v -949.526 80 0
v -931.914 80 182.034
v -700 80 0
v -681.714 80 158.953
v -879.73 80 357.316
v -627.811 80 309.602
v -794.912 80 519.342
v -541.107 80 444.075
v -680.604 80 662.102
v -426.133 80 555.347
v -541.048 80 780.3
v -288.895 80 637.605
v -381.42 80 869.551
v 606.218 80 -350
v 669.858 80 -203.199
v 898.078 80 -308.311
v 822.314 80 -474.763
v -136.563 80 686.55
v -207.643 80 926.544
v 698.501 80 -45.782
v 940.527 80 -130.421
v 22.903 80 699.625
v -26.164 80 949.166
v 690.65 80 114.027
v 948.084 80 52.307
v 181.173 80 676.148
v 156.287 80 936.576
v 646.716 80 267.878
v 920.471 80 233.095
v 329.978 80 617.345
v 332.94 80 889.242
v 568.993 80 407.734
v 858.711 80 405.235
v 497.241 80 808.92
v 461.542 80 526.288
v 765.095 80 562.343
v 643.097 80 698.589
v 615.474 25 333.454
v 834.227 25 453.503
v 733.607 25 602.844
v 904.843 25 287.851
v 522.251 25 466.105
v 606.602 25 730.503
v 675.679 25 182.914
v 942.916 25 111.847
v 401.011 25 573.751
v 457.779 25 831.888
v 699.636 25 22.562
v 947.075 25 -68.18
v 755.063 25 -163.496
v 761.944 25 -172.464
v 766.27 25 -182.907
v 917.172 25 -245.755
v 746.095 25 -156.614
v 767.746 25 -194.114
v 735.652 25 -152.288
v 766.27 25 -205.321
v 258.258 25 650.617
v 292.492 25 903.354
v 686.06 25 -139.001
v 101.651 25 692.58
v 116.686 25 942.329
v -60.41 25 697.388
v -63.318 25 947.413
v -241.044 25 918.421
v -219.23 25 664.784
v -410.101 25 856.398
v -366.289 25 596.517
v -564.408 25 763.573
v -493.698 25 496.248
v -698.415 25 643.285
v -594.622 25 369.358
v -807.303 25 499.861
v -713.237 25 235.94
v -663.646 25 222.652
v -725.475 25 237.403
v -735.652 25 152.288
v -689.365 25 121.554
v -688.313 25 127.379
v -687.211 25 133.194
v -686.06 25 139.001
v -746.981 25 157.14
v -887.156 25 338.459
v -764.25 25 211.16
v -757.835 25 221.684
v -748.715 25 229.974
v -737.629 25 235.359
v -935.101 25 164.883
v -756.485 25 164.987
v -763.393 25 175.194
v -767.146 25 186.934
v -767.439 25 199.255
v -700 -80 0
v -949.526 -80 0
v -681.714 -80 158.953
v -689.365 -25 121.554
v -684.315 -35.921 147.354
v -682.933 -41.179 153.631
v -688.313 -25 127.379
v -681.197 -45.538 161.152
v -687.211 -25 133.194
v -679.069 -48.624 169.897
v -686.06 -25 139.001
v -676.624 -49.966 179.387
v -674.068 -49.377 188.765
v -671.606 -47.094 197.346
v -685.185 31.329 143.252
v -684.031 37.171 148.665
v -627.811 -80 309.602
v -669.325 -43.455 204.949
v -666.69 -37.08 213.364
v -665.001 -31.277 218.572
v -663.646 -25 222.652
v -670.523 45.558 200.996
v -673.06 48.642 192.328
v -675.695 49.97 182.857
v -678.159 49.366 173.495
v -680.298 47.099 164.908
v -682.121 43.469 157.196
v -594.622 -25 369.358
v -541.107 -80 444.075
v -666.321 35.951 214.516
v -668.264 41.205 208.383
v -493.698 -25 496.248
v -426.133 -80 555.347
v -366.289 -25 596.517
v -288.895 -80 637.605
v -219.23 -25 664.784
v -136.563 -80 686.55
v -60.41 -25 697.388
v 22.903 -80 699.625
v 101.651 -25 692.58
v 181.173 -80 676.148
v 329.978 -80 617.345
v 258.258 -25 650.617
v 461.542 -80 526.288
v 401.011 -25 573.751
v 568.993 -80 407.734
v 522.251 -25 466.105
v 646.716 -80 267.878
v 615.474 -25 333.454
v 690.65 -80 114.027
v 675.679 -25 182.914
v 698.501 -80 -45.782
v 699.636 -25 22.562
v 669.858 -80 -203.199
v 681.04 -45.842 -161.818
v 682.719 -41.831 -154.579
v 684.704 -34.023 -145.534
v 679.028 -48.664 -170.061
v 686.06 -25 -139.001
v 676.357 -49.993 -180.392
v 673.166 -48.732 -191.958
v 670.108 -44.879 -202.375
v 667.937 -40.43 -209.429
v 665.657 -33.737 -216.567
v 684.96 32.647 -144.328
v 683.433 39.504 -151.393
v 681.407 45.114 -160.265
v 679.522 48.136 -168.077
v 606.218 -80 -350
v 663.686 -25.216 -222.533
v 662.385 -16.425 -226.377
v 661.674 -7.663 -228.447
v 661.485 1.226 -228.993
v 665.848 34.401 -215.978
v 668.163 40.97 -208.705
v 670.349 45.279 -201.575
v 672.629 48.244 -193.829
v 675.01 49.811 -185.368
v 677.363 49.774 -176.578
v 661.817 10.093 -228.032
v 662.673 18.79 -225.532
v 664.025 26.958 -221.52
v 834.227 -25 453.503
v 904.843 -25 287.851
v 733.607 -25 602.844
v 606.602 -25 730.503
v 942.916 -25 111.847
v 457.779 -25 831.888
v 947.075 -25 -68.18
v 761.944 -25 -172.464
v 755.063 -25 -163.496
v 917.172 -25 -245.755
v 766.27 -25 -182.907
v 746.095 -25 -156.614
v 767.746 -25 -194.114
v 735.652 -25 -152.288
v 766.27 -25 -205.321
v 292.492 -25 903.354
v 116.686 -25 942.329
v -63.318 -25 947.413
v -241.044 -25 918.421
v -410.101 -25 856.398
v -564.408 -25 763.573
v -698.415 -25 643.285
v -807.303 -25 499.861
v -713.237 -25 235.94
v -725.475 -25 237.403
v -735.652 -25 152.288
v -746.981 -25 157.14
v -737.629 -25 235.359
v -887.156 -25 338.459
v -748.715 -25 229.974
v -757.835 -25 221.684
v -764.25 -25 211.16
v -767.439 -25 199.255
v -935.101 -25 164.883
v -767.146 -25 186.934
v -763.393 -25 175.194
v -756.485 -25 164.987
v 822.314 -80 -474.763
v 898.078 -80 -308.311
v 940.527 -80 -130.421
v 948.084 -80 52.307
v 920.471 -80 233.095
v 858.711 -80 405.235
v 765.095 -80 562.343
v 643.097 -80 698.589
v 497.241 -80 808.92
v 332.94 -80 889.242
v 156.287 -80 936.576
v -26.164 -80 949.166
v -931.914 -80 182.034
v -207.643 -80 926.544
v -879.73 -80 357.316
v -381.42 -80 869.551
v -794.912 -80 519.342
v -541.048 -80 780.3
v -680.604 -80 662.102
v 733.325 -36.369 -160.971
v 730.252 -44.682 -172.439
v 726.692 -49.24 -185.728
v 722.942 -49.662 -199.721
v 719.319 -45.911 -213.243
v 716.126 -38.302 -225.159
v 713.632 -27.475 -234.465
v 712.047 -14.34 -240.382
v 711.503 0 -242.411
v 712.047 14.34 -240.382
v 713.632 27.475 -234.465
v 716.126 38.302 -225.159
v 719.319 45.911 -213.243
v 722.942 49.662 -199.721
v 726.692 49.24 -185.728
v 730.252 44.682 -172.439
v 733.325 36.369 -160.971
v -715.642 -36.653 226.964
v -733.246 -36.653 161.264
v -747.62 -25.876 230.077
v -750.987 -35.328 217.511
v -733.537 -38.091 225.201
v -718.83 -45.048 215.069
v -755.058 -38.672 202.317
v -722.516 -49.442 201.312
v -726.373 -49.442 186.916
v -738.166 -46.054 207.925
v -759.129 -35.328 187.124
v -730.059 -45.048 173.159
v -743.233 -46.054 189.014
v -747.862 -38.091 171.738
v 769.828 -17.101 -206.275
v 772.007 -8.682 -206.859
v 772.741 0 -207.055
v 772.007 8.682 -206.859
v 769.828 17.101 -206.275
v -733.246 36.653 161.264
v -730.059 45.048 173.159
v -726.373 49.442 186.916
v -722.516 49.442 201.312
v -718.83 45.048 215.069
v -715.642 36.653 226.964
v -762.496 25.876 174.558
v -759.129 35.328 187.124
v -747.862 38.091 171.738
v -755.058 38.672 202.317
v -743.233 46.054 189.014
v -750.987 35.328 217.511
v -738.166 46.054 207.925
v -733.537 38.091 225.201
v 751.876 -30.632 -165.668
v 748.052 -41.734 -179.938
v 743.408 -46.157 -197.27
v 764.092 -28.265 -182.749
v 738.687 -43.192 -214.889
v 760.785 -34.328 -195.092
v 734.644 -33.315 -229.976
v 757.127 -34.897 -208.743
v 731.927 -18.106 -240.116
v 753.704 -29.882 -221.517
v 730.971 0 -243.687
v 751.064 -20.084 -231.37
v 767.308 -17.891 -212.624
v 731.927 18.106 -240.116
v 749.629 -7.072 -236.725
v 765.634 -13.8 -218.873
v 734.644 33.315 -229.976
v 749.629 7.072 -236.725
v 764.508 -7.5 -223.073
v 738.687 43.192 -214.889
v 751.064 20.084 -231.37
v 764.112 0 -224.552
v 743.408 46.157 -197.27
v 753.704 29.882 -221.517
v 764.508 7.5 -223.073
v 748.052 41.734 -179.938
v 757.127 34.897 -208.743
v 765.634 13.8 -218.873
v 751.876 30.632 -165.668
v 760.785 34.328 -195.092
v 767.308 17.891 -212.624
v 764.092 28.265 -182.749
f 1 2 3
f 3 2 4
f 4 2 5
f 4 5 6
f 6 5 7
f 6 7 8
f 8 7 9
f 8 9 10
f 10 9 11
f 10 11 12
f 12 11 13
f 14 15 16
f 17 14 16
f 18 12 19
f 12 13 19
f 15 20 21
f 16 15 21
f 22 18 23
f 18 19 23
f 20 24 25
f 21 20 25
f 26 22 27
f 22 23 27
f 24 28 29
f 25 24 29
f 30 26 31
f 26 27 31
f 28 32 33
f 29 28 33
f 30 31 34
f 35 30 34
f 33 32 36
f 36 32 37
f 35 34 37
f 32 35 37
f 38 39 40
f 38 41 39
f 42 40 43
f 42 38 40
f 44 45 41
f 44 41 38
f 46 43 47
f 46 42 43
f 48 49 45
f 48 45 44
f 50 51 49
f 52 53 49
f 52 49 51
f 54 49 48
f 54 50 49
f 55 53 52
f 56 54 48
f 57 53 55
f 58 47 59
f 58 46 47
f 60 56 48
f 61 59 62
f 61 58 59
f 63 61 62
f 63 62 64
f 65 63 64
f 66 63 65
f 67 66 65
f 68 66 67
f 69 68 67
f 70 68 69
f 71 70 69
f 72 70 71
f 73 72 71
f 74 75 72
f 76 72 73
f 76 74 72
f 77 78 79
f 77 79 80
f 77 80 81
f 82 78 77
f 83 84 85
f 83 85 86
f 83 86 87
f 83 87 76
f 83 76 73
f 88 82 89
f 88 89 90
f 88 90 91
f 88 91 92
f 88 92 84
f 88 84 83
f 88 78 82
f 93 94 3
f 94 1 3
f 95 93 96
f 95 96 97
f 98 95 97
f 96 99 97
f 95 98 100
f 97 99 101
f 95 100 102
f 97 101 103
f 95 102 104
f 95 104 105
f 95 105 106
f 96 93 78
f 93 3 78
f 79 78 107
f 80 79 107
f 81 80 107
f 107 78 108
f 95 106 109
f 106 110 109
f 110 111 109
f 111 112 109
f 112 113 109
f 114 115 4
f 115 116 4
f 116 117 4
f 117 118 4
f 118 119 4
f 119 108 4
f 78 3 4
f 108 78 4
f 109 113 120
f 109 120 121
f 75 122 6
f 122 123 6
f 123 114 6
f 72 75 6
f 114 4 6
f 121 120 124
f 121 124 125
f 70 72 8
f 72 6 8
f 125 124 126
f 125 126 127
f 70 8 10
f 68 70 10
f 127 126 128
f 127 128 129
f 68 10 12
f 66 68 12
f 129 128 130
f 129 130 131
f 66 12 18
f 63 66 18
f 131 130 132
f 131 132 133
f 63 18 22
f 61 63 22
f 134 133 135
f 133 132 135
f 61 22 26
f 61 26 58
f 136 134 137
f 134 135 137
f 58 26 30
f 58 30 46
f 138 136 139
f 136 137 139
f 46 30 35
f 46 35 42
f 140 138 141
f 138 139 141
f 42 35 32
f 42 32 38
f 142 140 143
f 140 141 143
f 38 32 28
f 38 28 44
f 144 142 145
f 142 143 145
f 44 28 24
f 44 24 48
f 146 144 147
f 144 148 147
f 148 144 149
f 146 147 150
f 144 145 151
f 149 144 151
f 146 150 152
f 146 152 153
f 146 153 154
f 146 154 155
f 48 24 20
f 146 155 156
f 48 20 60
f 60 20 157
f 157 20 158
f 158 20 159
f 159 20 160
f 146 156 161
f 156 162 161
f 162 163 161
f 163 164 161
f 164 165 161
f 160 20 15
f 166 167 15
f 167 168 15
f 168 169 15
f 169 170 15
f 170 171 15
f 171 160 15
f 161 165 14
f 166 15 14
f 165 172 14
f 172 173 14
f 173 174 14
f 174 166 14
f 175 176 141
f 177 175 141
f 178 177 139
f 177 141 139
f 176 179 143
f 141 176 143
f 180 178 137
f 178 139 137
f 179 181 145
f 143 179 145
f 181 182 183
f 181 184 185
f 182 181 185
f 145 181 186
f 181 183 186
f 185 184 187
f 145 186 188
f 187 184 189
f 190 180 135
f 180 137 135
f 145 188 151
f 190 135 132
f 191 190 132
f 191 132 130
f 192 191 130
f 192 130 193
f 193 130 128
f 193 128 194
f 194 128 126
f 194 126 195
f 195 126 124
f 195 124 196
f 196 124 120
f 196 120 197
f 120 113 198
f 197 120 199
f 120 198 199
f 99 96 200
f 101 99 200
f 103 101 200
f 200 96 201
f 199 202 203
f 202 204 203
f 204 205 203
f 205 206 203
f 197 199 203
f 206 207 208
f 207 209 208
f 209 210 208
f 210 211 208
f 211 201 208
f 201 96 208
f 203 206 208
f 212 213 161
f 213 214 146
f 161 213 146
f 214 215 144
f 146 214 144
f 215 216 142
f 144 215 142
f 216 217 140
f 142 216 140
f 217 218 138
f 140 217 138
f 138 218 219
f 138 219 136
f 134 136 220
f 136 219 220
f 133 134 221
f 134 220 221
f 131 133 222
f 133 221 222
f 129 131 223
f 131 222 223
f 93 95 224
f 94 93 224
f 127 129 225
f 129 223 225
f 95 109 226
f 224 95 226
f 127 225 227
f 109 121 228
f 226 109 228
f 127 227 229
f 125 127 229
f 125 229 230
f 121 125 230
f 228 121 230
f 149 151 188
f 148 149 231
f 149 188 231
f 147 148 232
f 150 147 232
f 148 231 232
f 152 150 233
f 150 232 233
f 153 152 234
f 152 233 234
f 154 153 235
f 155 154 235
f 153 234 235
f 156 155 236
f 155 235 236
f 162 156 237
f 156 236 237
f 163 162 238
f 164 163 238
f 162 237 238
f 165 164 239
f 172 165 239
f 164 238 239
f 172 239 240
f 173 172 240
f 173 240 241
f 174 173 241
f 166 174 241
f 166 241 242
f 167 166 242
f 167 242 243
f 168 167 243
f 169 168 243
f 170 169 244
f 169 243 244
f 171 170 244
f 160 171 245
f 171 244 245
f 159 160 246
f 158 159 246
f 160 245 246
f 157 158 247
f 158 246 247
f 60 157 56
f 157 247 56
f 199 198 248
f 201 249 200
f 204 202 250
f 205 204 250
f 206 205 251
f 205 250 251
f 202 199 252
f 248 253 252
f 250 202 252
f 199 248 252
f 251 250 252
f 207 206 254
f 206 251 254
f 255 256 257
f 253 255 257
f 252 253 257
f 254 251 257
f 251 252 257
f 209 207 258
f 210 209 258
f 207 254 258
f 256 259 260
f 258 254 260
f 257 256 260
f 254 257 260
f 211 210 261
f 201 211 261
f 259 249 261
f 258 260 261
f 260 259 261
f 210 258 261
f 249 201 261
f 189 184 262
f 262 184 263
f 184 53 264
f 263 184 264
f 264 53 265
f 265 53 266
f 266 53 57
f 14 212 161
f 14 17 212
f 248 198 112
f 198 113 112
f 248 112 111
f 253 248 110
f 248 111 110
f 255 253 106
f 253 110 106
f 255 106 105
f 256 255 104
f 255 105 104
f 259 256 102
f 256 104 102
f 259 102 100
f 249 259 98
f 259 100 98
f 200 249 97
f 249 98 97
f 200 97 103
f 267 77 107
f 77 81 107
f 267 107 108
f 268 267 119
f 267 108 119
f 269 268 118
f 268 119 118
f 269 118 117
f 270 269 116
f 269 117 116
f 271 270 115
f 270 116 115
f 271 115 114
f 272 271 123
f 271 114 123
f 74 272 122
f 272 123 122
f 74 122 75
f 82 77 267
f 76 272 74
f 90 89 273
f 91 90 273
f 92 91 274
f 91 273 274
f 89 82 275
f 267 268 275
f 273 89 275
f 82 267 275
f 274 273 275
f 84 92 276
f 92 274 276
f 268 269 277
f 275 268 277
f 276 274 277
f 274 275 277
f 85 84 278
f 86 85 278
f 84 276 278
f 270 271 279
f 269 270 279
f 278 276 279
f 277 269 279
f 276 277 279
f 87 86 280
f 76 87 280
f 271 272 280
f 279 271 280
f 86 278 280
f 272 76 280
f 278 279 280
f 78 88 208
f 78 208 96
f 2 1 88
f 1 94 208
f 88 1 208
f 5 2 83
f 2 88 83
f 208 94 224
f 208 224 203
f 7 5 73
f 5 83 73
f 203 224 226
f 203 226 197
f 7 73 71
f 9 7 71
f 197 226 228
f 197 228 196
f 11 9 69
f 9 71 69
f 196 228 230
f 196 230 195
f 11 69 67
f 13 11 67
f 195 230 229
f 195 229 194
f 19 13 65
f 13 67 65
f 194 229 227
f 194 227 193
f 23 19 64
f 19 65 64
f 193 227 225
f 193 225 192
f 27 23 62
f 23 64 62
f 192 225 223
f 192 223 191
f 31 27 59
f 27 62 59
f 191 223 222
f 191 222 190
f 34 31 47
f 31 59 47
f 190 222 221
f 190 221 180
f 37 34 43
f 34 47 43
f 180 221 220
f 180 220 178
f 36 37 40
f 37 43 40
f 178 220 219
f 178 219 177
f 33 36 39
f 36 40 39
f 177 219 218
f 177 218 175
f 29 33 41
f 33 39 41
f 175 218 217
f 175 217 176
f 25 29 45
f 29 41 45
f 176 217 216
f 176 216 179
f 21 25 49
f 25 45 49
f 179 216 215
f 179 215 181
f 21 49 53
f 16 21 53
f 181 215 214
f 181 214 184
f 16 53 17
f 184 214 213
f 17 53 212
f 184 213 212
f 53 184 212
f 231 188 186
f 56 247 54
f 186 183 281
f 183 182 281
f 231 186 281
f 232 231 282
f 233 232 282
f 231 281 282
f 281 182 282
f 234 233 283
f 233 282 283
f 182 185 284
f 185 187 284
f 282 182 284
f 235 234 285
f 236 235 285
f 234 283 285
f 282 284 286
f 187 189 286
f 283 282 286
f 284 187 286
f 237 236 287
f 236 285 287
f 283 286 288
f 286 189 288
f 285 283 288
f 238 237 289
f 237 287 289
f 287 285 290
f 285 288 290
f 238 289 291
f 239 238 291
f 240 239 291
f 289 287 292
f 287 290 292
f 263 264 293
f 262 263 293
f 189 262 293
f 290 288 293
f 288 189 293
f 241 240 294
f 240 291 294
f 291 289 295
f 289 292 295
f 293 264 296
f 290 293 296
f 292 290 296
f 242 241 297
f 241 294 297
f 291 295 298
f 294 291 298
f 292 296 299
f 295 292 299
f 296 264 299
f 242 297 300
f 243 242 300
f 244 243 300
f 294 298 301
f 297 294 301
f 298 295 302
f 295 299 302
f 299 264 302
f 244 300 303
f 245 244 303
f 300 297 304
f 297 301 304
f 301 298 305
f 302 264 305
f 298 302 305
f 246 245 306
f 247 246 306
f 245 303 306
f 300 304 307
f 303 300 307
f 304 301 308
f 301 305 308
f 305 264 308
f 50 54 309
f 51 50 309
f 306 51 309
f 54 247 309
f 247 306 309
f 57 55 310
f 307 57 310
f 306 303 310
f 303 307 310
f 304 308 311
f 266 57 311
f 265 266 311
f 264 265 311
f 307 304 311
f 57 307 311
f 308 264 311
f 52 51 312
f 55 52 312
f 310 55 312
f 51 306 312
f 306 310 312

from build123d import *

# Parameters (mm, degrees)
REVOLVE_3_ANGLE               = 210
SKETCH_11_W                   = 1123.766968822
SKETCH_11_H                   = 50
CUT_REVOLVE_6_ANGLE           = 5
CUT_REVOLVE_6_OTHER_WAY_ANGLE = 180


with BuildPart() as part:
    # 草图4 → 旋转3 (revolve)
    with BuildSketch(Plane.XY):
        Polygon((-949.526197638, 0), (-949.526197638, -80), (-700, -80), (-700, 80), (-949.526197638, 80), align=None)
    revolve(axis=Axis((0, 0, 0), (0, 1, 0)), revolution_arc=REVOLVE_3_ANGLE)

    # 草图10 → 切除-旋转5 (revolve, cut)
    with BuildSketch(Plane(origin=(0, 0, 0), x_dir=(0.9659258262890681, 0, -0.2588190451025215), z_dir=(0.2588190451025215, 0, 0.9659258262890681)), mode=Mode.PRIVATE) as cut_revolve_5_sk:
        with BuildLine():
            Line((-750, 50), (750, 50))
            ThreePointArc((750, 50), (785.355339059, 35.355339059), (800, 0))
            Line((800, 0), (-800, 0))
            ThreePointArc((-800, 0), (-785.355339059, 35.355339059), (-750, 50))
        make_face()
    revolve(cut_revolve_5_sk.sketch.rotate(Axis((-1280.947086283, 0, 343.228737317), (0.9659258262890681, 0, -0.25881904510252157)), 90), axis=Axis((-1280.947086283, 0, 343.228737317), (0.9659258262890681, 0, -0.25881904510252157)), mode=Mode.SUBTRACT)

    # 草图11 → 切除-旋转6 (revolve, cut)
    with BuildSketch(Plane(origin=(0, 0, 0), x_dir=(0.9659258262890681, 0, -0.2588190451025215), z_dir=(0.2588190451025215, 0, 0.9659258262890681))):
        with Locations((-561.883484411, 0)):
            Rectangle(SKETCH_11_W, SKETCH_11_H)
    revolve(axis=Axis((0, 25, 0), (0, -1, 0)), revolution_arc=CUT_REVOLVE_6_ANGLE, mode=Mode.SUBTRACT)

    # 草图11 → 切除-旋转6 other way (revolve, cut)
    with BuildSketch(Plane(origin=(0, 0, 0), x_dir=(0.9659258262890681, 0, -0.2588190451025215), z_dir=(0.2588190451025215, 0, 0.9659258262890681))):
        with Locations((-561.883484411, 0)):
            Rectangle(SKETCH_11_W, SKETCH_11_H)
    revolve(axis=Axis((0, 25, 0), (0, 1, 0)), revolution_arc=CUT_REVOLVE_6_OTHER_WAY_ANGLE, mode=Mode.SUBTRACT)


solid = part.part
